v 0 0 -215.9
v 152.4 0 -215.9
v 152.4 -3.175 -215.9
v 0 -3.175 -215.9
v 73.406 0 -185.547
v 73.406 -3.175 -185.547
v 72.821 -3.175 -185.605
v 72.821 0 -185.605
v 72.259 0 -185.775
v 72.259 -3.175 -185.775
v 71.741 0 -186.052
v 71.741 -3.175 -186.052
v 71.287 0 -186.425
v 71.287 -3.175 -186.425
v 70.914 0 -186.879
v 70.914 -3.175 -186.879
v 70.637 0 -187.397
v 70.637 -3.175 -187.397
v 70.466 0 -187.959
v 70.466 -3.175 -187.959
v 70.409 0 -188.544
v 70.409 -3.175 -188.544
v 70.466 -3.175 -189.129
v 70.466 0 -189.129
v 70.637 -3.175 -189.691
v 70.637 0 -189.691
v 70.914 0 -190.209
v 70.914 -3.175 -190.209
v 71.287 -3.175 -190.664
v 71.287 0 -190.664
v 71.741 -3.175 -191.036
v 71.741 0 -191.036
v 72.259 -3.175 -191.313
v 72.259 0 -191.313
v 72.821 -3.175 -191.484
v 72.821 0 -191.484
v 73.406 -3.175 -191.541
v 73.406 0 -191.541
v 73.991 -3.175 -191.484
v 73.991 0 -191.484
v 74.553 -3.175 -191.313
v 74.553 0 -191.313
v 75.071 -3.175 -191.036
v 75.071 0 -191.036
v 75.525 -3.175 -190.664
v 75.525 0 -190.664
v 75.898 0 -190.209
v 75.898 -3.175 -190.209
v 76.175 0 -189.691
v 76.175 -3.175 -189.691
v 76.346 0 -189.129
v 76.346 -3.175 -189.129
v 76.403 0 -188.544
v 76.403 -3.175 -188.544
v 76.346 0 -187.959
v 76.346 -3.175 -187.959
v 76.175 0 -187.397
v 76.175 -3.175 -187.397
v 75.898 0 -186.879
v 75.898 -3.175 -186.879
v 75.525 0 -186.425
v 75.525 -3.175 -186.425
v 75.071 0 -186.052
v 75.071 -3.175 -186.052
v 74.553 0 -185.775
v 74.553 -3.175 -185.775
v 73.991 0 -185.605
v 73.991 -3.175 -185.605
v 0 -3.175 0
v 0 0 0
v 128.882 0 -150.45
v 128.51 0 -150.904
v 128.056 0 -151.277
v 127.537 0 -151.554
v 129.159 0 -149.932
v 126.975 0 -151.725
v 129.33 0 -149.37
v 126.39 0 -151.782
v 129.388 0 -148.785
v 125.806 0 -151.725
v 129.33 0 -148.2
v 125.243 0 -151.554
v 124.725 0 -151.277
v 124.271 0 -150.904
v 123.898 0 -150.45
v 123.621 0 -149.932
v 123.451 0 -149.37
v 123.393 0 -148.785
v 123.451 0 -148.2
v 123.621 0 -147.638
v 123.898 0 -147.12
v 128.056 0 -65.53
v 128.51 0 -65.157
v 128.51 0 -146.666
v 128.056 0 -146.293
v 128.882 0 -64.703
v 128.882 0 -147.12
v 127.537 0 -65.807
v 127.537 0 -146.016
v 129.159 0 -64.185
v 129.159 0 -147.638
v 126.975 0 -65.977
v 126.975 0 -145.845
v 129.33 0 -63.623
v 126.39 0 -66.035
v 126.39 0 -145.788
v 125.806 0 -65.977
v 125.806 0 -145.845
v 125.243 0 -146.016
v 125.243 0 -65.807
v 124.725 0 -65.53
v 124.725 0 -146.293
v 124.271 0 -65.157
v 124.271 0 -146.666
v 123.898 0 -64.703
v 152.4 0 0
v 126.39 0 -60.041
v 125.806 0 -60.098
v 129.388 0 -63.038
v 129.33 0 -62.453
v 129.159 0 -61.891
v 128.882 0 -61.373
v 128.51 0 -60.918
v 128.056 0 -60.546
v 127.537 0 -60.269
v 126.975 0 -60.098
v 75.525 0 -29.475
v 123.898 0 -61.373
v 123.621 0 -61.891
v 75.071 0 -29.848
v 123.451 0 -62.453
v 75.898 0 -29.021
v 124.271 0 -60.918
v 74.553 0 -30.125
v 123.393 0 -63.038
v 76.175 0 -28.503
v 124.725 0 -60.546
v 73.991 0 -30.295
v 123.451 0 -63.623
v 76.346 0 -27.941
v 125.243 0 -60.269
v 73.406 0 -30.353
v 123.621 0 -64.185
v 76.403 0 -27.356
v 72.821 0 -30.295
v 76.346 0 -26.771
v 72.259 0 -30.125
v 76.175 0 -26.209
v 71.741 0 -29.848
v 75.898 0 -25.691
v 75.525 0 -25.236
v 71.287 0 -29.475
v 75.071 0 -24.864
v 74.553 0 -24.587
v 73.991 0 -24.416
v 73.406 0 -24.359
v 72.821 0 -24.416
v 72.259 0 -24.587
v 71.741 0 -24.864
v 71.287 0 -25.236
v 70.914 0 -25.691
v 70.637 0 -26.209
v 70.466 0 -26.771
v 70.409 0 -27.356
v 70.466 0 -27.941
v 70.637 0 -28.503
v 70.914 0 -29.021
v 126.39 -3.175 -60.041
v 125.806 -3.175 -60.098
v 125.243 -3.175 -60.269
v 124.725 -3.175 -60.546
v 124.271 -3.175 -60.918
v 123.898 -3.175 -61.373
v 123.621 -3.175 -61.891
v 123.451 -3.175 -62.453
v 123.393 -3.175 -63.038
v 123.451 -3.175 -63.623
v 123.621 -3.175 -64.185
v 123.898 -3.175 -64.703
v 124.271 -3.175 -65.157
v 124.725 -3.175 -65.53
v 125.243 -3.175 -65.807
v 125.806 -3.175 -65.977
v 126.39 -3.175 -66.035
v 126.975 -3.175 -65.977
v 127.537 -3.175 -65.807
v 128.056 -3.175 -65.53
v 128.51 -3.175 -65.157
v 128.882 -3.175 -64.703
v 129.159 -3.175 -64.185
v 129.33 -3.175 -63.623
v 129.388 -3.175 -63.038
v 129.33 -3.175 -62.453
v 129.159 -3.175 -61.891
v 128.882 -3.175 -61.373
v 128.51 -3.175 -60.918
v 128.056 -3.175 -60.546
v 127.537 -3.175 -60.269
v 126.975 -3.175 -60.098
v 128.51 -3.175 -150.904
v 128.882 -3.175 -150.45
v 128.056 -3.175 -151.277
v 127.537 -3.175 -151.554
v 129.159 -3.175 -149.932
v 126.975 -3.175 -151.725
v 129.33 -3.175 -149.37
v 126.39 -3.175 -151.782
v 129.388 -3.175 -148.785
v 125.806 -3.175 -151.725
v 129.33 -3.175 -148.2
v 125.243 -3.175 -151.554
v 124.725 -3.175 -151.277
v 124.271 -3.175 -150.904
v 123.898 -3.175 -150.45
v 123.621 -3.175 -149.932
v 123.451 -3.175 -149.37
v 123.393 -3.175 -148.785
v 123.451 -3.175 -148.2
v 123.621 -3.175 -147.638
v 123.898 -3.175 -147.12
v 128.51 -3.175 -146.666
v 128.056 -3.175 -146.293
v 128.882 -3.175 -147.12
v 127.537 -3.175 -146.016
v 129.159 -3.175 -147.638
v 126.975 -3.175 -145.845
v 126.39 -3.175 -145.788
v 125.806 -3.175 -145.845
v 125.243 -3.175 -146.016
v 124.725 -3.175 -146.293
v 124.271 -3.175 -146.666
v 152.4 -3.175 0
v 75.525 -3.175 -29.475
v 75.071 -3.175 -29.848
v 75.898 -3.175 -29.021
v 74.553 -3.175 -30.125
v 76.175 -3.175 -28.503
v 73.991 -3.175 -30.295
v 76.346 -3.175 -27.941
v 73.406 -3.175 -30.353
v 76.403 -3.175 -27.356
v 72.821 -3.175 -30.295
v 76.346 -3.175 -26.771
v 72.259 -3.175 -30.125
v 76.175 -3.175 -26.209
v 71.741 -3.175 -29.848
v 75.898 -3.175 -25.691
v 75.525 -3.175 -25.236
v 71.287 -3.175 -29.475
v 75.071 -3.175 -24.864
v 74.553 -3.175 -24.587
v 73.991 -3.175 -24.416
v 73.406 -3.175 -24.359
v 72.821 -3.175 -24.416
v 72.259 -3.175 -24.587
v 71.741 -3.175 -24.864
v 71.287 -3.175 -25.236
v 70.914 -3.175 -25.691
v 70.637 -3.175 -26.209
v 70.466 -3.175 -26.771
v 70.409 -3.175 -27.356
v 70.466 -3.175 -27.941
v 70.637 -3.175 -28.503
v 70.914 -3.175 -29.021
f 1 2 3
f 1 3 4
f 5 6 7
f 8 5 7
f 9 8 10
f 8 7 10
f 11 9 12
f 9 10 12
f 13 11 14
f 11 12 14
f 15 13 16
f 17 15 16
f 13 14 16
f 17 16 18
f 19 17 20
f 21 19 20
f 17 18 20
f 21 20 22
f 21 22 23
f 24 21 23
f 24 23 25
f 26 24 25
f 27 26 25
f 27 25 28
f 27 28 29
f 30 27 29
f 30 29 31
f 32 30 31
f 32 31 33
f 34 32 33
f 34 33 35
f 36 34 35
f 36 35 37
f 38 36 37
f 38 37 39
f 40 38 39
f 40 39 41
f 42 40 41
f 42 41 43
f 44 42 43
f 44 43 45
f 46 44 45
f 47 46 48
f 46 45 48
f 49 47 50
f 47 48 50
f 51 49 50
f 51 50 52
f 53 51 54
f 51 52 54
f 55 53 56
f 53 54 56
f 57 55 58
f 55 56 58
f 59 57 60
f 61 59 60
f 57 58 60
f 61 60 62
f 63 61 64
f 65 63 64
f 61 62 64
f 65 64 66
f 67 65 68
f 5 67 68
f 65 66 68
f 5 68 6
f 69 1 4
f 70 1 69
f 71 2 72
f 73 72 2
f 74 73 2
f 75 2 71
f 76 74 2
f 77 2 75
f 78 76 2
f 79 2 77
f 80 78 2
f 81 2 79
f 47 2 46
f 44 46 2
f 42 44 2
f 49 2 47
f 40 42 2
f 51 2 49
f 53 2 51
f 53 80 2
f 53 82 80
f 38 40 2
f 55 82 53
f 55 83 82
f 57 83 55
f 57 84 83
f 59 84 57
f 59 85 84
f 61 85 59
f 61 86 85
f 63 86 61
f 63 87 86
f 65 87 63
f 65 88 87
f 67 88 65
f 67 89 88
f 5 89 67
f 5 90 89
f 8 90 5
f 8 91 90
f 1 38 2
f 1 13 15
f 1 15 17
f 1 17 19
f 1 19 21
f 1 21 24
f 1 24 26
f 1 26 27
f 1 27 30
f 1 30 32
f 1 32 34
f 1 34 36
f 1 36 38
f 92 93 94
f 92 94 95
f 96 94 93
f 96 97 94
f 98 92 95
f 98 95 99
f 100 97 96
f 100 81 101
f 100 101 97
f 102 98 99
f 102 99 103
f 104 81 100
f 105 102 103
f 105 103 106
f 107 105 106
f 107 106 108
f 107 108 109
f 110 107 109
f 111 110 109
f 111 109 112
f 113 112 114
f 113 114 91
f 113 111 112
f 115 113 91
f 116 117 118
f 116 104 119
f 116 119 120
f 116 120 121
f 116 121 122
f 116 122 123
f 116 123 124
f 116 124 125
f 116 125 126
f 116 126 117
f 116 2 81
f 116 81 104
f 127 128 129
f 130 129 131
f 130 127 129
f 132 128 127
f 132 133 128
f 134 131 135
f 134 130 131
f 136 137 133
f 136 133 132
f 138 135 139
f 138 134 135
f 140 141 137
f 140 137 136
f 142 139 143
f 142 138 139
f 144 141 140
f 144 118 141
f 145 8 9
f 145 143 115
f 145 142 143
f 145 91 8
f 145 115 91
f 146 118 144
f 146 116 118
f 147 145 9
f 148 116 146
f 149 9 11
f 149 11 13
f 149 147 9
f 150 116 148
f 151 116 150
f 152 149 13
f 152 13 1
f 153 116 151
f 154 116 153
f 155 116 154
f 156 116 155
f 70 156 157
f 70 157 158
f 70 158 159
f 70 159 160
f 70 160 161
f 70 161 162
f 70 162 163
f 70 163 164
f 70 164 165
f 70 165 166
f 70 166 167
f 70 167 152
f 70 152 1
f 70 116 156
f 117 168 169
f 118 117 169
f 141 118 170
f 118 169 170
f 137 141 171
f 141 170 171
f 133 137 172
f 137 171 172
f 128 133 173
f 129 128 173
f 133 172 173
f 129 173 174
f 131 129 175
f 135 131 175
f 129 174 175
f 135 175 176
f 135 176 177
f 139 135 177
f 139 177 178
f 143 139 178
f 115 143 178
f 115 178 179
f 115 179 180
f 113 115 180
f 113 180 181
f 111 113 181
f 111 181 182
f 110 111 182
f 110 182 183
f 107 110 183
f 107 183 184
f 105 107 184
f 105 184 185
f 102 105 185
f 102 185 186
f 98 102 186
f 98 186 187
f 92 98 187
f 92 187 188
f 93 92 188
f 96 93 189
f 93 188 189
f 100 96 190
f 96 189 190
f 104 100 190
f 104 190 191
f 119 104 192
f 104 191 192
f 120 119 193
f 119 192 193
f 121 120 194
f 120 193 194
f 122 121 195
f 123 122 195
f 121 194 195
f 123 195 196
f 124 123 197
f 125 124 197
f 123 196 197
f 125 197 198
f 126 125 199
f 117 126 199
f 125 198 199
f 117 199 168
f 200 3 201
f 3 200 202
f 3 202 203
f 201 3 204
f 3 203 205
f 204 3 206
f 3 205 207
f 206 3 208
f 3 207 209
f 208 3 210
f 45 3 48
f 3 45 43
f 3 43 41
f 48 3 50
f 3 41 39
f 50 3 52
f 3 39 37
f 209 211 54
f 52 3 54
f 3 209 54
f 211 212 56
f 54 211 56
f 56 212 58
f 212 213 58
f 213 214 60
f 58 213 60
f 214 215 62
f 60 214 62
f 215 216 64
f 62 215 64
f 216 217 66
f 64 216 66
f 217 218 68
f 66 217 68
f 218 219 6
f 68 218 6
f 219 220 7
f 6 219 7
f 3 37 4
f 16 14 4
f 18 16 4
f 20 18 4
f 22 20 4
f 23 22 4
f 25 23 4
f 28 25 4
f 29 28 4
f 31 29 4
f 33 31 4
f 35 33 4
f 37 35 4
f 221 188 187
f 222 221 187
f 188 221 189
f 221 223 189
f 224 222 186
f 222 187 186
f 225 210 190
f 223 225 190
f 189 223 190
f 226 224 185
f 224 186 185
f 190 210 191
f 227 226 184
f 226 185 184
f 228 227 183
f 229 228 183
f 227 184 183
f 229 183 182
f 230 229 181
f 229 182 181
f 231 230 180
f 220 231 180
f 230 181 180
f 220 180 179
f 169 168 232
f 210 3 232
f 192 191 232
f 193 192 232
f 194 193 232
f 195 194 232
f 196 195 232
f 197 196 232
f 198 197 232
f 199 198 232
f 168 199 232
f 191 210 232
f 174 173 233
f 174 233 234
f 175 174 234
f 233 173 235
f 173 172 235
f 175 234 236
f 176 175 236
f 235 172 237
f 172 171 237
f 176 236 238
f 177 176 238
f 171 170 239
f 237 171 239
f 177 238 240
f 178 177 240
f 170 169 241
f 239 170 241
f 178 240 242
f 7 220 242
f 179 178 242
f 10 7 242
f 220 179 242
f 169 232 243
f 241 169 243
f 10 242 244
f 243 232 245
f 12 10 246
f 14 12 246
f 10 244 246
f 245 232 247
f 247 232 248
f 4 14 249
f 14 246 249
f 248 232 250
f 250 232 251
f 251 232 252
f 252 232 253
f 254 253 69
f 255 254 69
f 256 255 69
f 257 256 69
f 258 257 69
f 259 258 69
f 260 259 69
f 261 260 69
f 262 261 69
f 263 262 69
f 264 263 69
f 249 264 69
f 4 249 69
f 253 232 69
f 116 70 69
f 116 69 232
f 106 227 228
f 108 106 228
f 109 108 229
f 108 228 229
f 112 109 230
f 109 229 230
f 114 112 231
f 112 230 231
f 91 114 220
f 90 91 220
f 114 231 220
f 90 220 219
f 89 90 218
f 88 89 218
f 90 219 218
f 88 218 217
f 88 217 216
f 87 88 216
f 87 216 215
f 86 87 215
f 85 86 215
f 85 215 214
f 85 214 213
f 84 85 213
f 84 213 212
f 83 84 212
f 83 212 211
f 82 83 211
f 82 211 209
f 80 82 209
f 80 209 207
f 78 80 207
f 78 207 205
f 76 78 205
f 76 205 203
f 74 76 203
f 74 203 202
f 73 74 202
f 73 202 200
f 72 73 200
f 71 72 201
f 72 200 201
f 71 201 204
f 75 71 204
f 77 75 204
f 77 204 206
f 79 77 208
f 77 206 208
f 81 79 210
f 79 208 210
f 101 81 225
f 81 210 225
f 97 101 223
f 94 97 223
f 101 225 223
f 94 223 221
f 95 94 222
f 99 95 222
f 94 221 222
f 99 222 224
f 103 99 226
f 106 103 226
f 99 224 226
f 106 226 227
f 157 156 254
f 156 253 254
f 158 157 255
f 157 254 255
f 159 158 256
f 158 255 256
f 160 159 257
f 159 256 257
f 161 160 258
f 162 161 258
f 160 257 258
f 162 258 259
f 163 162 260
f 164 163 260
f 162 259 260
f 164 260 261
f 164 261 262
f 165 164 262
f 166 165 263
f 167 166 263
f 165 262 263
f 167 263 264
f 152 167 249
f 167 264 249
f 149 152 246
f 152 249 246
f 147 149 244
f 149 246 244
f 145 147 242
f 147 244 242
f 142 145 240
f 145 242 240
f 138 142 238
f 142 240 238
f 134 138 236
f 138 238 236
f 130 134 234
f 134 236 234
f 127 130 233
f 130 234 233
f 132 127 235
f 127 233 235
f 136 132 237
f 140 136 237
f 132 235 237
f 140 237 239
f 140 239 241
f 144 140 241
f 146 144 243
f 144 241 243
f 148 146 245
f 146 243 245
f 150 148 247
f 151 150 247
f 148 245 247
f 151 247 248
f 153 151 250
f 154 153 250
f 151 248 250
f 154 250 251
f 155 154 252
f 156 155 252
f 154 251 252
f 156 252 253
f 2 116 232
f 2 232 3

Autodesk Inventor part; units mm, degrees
ref_plane "YZ Plane" through (0, 0, 0) normal (1, 0, 0) x (0, 1, 0)
ref_plane "XZ Plane" through (0, 0, 0) normal (0, 1, 0) x (-1, 0, 0)
ref_plane "XY Plane" through (0, 0, 0) normal (0, 0, 1) x (1, 0, 0)
sketch "Sketch3" plane through (0, 0, 0) normal (0, 1, 0) x (-1, 0, 0)
  line L0 (0, 0) -> (-152.4, 0)
  line L1 (-152.4, 0) -> (-152.4, -215.9)
  line L2 (-152.4, -215.9) -> (0, -215.9)
  line L3 (0, -215.9) -> (0, 0)
  dimension "d8" = 152.4
  dimension "d9" = 215.9
extrude "Extrusion1" add sketch "Sketch3" against normal blind 3.175
sketch "Sketch4" plane through (0, 0, 0) normal (0, 1, 0) x (1, 0, 0)
  line L0 (152.4, 0) -> (152.4, 215.9) projected
  line L1 (0, 0) -> (152.4, 0) projected
  line L2 (152.4, 215.9) -> (0, 215.9) projected
  point P0 (126.3904, 63.0378)
  point P1 (126.3904, 148.7849)
  point P2 (73.406, 188.5442)
  point P3 (73.406, 27.3558)
  dimension "d12" = 26.0096
  dimension "d13" = 26.0096
  dimension "d14" = 78.994
  dimension "d15" = 78.994
  dimension "d16" = 27.3558
  dimension "d17" = 27.3558
  dimension "d29" = 63.0378
  dimension "d30" = 67.1151
hole "Hole1" at (126.3904, 0, -63.0378) at (126.3904, 0, -148.7849) at (73.406, 0, -188.5442) at (73.406, 0, -27.3558) direction (0, -1, 0) diameter 5.9944 end through all
sketch "Sketch5" plane through (0, 0, 0) normal (0, 1, 0) x (1, 0, 0)
  circle A0 centre (126.3904, 148.7849) radius 2.9972 projected
  circle A1 centre (126.3904, 148.7849) radius 6.477
  circle A2 centre (126.3904, 63.0378) radius 2.9972 projected
  circle A3 centre (126.3904, 63.0378) radius 6.477
  circle A4 centre (73.406, 27.3558) radius 2.9972 projected
  circle A5 centre (73.406, 27.3558) radius 10.9855
  circle A6 centre (73.406, 188.5442) radius 2.9972 projected
  circle A7 centre (73.406, 188.5442) radius 10.9855
  line L0 (131.1992, 58.6988) -> (80.1831, 18.7099)
  line L1 (132.8674, 63.0378) -> (132.8674, 148.7849)
  line L2 (80.1831, 197.1901) -> (129.3876, 154.5267)
  line L3 (62.4205, 27.3558) -> (62.4205, 188.5442)
  point P0 (0, 0)
  dimension "d25" = 12.954
  dimension "d26" = 12.954
  dimension "d27" = 21.971
  dimension "d28" = 21.971
equation "\"d13\" = d12"
equation "\"d15\" = d14"
equation "\"d17\" = d16"
properties part number "recreated v of plate"
